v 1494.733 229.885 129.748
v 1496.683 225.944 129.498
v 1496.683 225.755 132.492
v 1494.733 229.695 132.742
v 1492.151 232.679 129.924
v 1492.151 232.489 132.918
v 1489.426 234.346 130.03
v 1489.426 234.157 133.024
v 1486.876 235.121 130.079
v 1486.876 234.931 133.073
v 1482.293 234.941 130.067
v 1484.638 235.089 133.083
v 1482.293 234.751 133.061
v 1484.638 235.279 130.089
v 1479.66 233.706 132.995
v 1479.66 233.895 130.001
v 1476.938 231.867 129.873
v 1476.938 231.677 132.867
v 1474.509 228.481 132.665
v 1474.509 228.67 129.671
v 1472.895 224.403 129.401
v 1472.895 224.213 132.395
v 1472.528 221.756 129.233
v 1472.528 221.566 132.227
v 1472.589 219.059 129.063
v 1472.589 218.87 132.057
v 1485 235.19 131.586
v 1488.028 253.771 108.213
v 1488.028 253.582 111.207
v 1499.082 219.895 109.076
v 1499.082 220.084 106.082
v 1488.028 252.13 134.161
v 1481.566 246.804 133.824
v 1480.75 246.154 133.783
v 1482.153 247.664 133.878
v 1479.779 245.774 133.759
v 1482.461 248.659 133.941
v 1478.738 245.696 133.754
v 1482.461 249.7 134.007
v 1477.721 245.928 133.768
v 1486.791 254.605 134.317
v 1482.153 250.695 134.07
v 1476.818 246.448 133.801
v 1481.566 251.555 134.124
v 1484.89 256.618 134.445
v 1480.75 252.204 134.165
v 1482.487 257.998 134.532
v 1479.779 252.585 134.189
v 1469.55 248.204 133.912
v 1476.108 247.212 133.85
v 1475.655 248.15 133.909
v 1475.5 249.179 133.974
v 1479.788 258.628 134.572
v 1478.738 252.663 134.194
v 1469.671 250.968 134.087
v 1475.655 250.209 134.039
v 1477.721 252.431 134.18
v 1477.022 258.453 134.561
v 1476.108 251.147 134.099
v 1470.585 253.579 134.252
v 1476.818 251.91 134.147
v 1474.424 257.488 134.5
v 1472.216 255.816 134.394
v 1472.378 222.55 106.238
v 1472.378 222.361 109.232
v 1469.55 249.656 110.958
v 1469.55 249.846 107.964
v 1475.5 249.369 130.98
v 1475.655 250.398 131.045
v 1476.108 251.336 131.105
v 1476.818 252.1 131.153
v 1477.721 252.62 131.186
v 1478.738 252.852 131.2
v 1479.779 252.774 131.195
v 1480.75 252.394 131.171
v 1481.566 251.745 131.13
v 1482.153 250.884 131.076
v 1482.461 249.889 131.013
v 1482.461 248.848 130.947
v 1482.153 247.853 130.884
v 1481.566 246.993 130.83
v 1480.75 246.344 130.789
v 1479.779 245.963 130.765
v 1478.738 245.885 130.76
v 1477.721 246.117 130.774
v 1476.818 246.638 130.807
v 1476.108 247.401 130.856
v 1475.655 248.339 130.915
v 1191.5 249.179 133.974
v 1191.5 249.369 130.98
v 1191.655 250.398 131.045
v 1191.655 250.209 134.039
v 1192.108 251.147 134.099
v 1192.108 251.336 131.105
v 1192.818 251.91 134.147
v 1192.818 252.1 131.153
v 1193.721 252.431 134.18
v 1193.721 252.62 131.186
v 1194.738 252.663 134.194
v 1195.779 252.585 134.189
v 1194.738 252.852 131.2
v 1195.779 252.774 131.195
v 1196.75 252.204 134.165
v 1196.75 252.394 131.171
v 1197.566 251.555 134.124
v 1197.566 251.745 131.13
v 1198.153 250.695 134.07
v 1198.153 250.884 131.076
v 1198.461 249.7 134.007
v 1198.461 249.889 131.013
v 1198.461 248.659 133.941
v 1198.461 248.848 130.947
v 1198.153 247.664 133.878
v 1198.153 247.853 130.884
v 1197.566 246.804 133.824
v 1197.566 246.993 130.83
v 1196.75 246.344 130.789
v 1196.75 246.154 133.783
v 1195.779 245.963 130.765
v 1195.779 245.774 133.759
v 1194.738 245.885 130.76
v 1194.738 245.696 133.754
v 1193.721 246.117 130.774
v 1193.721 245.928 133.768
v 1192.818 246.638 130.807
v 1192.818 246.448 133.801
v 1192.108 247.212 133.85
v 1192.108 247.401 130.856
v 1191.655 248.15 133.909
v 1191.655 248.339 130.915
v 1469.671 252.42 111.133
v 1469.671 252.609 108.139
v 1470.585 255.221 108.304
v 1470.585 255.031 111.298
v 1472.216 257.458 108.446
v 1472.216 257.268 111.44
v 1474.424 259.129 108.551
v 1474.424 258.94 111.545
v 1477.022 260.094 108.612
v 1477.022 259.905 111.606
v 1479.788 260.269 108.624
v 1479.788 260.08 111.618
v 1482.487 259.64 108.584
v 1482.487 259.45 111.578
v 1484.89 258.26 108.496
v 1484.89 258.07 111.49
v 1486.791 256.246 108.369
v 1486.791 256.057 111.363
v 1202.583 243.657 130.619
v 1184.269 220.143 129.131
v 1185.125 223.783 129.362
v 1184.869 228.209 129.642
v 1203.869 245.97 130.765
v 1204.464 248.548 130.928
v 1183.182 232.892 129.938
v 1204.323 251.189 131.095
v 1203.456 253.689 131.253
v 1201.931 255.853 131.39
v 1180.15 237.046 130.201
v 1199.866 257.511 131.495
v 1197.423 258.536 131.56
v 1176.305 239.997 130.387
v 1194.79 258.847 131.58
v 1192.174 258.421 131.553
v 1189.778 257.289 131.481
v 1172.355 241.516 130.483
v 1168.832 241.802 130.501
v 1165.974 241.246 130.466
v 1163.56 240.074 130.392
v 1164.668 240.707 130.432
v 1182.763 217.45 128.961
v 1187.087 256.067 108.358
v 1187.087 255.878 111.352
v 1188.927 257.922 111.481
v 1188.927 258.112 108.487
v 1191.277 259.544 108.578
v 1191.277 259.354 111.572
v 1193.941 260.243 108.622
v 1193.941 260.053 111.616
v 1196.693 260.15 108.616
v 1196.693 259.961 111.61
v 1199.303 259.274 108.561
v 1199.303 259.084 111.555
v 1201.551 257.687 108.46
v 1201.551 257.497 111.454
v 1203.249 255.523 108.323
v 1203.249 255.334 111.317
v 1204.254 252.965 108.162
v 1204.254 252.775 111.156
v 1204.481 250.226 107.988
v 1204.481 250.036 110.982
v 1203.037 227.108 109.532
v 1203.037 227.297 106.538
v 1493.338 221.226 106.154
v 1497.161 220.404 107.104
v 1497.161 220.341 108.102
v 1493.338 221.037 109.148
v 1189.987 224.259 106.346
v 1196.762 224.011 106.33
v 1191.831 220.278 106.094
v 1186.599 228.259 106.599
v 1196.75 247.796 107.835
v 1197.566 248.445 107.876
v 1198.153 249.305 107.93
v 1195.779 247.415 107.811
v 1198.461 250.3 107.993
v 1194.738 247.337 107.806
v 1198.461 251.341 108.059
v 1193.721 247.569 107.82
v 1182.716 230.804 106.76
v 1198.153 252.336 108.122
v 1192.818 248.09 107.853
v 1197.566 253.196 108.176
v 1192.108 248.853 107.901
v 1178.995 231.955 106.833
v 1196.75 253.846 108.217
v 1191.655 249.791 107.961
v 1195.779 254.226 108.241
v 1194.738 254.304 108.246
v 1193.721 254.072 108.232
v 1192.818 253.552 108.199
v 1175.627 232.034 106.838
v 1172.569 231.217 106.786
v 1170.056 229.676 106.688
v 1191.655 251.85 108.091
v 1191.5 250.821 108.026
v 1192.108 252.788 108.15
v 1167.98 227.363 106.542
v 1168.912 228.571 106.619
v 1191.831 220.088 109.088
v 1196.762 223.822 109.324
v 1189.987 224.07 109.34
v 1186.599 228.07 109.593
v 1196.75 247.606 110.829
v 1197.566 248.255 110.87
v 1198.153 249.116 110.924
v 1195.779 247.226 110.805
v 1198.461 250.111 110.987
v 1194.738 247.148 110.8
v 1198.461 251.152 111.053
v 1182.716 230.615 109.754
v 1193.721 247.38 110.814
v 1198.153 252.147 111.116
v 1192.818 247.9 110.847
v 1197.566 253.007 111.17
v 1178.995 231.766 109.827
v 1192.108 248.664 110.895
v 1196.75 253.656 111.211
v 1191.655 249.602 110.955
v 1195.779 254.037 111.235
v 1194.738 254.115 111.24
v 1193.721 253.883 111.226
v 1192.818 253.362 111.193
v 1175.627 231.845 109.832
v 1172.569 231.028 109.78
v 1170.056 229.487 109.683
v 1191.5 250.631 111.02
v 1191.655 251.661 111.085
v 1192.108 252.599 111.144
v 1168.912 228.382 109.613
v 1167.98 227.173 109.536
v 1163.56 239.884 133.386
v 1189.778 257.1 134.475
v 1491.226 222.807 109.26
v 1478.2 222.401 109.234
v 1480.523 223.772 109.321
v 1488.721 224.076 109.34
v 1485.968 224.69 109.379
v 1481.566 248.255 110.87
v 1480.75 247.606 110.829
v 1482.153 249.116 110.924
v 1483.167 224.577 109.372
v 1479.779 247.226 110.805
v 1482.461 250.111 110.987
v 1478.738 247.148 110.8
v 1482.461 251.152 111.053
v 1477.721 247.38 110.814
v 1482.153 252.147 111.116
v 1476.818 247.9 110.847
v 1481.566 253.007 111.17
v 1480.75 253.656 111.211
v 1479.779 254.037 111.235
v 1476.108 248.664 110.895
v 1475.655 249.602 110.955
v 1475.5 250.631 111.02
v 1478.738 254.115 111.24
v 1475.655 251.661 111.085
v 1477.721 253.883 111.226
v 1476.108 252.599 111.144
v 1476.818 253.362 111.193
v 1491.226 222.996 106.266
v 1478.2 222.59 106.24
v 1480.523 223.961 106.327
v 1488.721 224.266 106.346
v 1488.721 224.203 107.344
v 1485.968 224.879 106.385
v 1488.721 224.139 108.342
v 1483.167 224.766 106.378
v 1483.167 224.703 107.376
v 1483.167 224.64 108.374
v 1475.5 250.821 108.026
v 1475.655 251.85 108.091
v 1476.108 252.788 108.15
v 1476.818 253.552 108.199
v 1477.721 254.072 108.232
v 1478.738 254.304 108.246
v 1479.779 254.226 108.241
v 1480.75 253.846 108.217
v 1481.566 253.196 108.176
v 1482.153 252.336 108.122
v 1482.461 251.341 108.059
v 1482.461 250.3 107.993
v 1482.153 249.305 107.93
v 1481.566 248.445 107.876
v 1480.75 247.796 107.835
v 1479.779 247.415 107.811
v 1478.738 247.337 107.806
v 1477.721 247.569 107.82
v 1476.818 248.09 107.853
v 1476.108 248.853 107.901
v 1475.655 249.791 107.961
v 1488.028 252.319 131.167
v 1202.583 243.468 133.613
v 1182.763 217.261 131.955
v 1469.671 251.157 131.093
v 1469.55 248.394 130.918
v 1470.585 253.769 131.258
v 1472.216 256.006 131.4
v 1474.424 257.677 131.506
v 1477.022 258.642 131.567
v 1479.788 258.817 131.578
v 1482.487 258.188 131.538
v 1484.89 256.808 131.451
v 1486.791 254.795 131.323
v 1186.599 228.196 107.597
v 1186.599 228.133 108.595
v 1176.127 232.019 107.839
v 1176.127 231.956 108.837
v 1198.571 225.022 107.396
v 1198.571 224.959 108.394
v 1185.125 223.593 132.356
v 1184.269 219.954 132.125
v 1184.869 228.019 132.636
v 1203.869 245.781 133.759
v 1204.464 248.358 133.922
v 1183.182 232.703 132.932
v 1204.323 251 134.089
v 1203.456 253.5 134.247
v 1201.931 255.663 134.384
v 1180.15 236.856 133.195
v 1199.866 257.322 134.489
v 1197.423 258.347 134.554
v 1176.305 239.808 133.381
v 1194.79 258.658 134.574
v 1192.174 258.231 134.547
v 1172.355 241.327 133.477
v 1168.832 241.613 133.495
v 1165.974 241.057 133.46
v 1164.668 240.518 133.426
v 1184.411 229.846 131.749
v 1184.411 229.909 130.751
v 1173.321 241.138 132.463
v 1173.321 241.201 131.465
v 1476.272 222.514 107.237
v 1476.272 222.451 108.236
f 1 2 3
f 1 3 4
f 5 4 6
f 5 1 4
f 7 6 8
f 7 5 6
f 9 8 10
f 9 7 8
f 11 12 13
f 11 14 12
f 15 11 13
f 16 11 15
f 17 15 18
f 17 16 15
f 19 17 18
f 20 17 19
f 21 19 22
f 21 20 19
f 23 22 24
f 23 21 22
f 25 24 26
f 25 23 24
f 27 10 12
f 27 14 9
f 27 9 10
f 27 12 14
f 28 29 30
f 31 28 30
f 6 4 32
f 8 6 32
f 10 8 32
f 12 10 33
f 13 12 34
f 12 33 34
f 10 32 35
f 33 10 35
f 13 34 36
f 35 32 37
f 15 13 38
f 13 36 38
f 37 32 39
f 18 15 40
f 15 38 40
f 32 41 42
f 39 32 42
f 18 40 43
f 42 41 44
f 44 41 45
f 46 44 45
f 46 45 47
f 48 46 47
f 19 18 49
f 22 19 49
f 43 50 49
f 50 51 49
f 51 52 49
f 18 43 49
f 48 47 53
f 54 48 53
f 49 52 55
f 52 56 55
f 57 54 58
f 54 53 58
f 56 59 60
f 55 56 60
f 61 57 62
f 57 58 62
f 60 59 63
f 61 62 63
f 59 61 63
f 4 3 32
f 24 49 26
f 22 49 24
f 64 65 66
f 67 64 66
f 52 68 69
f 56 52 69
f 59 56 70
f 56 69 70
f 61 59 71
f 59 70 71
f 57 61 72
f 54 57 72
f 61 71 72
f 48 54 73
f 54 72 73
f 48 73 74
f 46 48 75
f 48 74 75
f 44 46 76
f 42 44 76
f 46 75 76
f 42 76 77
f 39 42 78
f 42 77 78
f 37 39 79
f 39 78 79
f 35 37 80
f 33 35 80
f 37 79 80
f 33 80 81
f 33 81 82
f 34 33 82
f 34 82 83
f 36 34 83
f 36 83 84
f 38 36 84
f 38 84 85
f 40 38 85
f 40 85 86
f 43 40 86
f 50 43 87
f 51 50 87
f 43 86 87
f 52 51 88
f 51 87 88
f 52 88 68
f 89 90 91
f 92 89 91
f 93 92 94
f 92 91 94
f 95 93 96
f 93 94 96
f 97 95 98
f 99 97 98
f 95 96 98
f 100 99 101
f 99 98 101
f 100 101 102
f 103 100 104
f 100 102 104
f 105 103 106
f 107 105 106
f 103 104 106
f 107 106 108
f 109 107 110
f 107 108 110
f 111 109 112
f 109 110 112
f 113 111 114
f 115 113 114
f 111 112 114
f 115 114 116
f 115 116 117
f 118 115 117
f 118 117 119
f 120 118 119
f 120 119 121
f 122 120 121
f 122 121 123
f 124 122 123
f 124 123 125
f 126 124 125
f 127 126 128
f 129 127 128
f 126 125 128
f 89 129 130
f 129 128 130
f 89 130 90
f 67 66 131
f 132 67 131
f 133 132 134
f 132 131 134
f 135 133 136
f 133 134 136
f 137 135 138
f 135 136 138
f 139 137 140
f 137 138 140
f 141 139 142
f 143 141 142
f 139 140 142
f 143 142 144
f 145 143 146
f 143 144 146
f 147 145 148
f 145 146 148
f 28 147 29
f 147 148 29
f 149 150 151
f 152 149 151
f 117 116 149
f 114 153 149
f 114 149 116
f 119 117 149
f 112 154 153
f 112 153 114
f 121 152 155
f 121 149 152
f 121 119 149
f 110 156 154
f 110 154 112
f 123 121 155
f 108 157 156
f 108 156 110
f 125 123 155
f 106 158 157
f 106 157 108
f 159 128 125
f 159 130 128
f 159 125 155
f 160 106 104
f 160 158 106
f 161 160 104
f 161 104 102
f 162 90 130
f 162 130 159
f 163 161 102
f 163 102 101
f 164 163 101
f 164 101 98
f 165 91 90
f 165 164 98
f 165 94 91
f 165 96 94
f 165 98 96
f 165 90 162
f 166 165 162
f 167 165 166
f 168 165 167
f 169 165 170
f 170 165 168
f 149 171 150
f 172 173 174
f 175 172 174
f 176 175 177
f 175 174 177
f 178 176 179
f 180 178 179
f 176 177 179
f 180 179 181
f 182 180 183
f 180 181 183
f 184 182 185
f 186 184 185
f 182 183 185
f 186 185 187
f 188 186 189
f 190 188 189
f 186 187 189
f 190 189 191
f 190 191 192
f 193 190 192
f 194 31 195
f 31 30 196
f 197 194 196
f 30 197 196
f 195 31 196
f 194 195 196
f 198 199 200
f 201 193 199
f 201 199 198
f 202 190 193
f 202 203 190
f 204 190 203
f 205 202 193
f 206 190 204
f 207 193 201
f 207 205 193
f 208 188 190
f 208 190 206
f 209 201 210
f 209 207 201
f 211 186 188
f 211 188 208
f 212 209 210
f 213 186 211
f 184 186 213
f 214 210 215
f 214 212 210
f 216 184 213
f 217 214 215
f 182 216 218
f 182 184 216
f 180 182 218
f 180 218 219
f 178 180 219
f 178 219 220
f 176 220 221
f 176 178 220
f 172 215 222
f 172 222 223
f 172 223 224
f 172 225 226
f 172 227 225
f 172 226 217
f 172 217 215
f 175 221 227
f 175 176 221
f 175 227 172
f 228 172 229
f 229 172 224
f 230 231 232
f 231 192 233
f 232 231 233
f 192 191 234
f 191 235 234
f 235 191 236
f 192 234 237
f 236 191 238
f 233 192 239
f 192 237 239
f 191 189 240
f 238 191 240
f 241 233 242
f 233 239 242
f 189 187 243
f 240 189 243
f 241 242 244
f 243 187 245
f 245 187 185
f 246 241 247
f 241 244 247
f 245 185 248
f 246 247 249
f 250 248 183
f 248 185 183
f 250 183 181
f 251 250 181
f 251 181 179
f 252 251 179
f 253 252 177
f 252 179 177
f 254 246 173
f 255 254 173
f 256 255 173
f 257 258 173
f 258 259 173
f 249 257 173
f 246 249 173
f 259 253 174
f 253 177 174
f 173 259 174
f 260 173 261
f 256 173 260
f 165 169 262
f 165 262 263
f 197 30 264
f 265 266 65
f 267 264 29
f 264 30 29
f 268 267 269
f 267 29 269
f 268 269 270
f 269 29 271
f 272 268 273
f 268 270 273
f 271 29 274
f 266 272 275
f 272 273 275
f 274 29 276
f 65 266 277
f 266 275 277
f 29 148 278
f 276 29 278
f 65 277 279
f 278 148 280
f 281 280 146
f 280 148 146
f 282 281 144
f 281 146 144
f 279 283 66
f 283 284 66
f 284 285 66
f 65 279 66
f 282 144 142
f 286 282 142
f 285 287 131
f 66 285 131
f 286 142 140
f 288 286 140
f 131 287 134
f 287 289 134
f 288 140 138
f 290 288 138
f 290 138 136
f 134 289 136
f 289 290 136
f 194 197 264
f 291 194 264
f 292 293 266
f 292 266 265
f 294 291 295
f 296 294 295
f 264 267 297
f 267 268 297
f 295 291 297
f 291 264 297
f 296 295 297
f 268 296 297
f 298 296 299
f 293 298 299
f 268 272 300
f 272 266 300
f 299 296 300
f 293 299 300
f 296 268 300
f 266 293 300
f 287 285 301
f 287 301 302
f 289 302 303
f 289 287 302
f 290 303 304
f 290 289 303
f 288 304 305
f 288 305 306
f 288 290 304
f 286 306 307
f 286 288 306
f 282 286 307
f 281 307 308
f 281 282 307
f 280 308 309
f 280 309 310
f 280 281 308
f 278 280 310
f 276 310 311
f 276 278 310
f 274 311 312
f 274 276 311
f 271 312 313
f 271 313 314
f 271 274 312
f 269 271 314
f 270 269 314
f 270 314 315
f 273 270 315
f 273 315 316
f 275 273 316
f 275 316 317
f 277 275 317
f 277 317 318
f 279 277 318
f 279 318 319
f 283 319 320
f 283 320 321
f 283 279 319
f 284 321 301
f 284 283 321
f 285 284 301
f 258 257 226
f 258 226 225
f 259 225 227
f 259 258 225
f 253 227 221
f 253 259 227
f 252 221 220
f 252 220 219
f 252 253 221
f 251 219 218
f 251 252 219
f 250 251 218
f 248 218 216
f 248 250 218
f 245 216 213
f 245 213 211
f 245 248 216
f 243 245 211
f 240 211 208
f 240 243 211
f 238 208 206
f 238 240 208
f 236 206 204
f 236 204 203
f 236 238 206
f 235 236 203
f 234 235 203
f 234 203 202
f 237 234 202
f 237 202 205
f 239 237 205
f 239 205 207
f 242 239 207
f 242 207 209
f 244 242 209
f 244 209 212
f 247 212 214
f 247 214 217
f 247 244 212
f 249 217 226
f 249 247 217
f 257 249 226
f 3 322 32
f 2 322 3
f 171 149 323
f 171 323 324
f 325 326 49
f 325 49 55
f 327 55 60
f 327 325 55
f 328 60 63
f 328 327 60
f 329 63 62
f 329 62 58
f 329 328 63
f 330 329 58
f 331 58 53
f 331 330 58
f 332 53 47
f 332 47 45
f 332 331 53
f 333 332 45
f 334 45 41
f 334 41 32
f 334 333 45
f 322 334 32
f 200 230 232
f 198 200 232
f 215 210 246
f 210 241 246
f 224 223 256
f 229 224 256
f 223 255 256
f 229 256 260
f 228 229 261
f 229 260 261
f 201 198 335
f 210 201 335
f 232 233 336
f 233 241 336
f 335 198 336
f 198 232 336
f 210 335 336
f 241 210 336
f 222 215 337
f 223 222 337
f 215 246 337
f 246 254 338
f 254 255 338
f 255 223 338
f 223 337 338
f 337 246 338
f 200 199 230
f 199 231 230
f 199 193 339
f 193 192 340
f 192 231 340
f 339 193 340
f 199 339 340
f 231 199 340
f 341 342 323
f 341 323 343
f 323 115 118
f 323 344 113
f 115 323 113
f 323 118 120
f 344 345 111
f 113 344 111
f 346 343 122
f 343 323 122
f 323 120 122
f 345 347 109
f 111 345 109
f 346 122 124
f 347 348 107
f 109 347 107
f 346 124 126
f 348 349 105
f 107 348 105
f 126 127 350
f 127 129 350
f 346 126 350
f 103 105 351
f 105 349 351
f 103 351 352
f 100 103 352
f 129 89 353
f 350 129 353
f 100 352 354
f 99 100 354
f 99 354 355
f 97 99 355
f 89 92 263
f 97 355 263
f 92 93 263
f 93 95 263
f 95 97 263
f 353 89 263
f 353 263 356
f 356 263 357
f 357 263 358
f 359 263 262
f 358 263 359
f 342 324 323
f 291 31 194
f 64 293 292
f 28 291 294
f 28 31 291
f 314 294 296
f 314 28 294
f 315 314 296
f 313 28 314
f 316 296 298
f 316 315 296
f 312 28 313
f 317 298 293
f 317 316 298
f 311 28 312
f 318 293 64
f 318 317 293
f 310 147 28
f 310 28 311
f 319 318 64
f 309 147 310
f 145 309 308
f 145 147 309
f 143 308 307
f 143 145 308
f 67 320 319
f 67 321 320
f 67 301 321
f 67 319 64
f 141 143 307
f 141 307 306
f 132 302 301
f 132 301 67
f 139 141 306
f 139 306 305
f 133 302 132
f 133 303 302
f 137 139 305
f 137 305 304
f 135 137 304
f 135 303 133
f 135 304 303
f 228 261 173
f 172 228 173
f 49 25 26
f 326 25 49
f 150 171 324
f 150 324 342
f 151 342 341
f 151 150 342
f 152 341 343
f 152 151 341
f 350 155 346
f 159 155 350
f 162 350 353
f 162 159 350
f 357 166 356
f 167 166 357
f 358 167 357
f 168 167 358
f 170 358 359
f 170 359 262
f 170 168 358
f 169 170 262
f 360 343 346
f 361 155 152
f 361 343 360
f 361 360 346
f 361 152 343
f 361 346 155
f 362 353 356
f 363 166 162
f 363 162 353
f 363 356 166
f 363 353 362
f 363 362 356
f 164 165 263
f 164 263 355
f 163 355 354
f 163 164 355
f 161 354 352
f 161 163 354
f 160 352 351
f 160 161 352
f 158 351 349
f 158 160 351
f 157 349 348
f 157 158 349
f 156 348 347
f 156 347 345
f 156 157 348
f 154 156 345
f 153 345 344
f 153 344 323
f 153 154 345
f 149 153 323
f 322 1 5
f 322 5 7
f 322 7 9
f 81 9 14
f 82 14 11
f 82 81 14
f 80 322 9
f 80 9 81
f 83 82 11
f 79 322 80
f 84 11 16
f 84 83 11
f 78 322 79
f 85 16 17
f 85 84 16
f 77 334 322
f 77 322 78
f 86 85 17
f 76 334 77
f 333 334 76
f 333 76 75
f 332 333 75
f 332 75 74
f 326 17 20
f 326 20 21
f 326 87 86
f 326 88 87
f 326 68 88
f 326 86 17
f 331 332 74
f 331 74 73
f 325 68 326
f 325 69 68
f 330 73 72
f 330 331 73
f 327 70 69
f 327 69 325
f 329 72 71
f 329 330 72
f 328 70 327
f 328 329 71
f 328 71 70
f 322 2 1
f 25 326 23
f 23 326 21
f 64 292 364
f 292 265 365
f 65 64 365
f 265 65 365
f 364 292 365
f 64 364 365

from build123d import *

# Parameters (mm, degrees)
SZKIC1_R                      = 3.5
DODANIE_WYCI_GNI_CIE1_DEPTH   = 3
DODANIE_WYCI_GNI_CIE1_2_DEPTH = 3
SZKIC2_R                      = 3.5
DODANIE_WYCI_GNI_CIE2_DEPTH   = 3
DODANIE_WYCI_GNI_CIE2_2_DEPTH = 3


with BuildPart() as part:
    # Szkic1 → Dodanie-wyciągnięcie1 (new body)
    with BuildSketch(Plane(origin=(0, -7.25805409, 114.747845399), x_dir=(-1, 0, 0), z_dir=(0, 0.063126051, -0.998005562))):
        with BuildLine():
            ThreePointArc((-1469.550369154, 256.162669348), (-1477.021998182, 266.4314406), (-1488.028232153, 260.096164982))
            Line((-1488.028232153, 260.096164982), (-1496.682707646, 233.668286007))
            add(Edge.make_bspline(
                [(-1496.682707646, 233.668286007), (-1494.549268537, 240.183096826), (-1489.671600164, 243.027652706), (-1485, 243.027652706), (-1478.171550536, 243.027652706), (-1471.493308251, 237.369876498), (-1472.589244959, 226.769589758)],
                knots=[0.295959603, 0.295959603, 0.295959603, 0.295959603, 0.5, 0.5, 0.5, 0.76496368, 0.76496368, 0.76496368, 0.76496368], degree=3, weights=[0.516898281, 0.56691223, 0.727946137, 1, 0.646715093, 0.480645525, 0.501791294]))
            Line((-1472.589244959, 226.769589758), (-1469.550369154, 256.162669348))
        make_face()
        with Locations((-1479, 257.139642668)):
            Circle(SZKIC1_R, mode=Mode.SUBTRACT)
    extrude(amount=-DODANIE_WYCI_GNI_CIE1_DEPTH)


with BuildPart() as body_2:
    # Szkic1 → Dodanie-wyci_gni_cie1 2 (new body)
    with BuildSketch(Plane(origin=(0, -7.25805409, 114.747845399), x_dir=(-1, 0, 0), z_dir=(0, 0.063126051, -0.998005562))):
        with BuildLine():
            Line((-1163.559881906, 247.826017638), (-1189.778452634, 265.07597955))
            ThreePointArc((-1189.778452634, 265.07597955), (-1201.931051804, 263.636605104), (-1202.582523544, 251.416414846))
            Line((-1202.582523544, 251.416414846), (-1182.76254688, 225.157554572))
            add(Edge.make_bspline(
                [(-1182.76254688, 225.157554572), (-1195.705807464, 242.305671187), (-1178.155883632, 257.429152624), (-1163.559881906, 247.826017638)],
                knots=[0.562562367, 0.562562367, 0.562562367, 0.562562367, 0.999146732, 0.999146732, 0.999146732, 0.999146732], degree=3, weights=[0.781062929, 0.344623783, 0.416467058, 0.996592754]))
        make_face()
        with Locations((-1195, 257.139642668)):
            Circle(SZKIC1_R, mode=Mode.SUBTRACT)
    extrude(amount=-DODANIE_WYCI_GNI_CIE1_2_DEPTH)


with BuildPart() as body_3:
    # Szkic2 → Dodanie-wyciągnięcie2 (new body)
    with BuildSketch(Plane(origin=(0, -5.995533068, 94.78773416), x_dir=(-1, 0, 0), z_dir=(0, 0.063126051, -0.998005562))):
        with BuildLine():
            add(Edge.make_bspline(
                [(-1499.081969424, 226.341741496), (-1497.164459003, 226.72545054), (-1495.249800372, 227.106857649), (-1493.338408358, 227.485899627)],
                knots=[0.978069865, 0.978069865, 0.978069865, 0.978069865, 0.987766131, 0.987766131, 0.987766131, 0.987766131], degree=3, weights=[0.974357504, 0.977963363, 0.981645873, 0.985405033]))
            add(Edge.make_bspline(
                [(-1493.338408358, 227.485899627), (-1488.968930095, 232.032323973), (-1483.121424188, 232.560272537), (-1478.200062015, 228.852682039)],
                knots=[0, 0, 0, 0, 1, 1, 1, 1], degree=3, weights=[1, 0.862951749, 0.862951749, 1]))
            add(Edge.make_bspline(
                [(-1478.200062015, 228.852682039), (-1476.26470701, 228.840500886), (-1474.323901246, 228.827162356), (-1472.378018702, 228.812644683)],
                knots=[0.015705516, 0.015705516, 0.015705516, 0.015705516, 0.02688398, 0.02688398, 0.02688398, 0.02688398], degree=3, weights=[0.970194637, 0.963236106, 0.956357884, 0.94955997]))
            Line((-1472.378018702, 228.812644683), (-1469.550369154, 256.162669348))
            ThreePointArc((-1469.550369154, 256.162669348), (-1477.021998182, 266.4314406), (-1488.028232153, 260.096164982))
            Line((-1488.028232153, 260.096164982), (-1499.081969424, 226.341741496))
        make_face()
        with Locations((-1479, 257.139642668)):
            Circle(SZKIC2_R, mode=Mode.SUBTRACT)
    extrude(amount=DODANIE_WYCI_GNI_CIE2_DEPTH)


with BuildPart() as body_4:
    # Szkic2 → Dodanie-wyci_gni_cie2 2 (new body)
    with BuildSketch(Plane(origin=(0, -5.995533068, 94.78773416), x_dir=(-1, 0, 0), z_dir=(0, 0.063126051, -0.998005562))):
        with BuildLine():
            ThreePointArc((-1187.086998027, 262.396485806), (-1198.029684937, 266.143586758), (-1204.481282298, 256.543583953))
            Line((-1204.481282298, 256.543583953), (-1203.036946157, 233.569070978))
            add(Edge.make_bspline(
                [(-1203.036946157, 233.569070978), (-1198.394891016, 231.545198423), (-1194.600848133, 229.118580489), (-1191.830864188, 226.535755676)],
                knots=[0.780966017, 0.780966017, 0.780966017, 0.780966017, 0.856944696, 0.856944696, 0.856944696, 0.856944696], degree=3, weights=[0.507671154, 0.520219191, 0.548161255, 0.591497344]))
            add(Edge.make_bspline(
                [(-1191.830864188, 226.535755676), (-1187.789848964, 239.236197933), (-1175.216880476, 244.52867786), (-1167.979845348, 233.634939595)],
                knots=[0, 0, 0, 0, 0.413856164, 0.413856164, 0.413856164, 0.413856164], degree=3, weights=[1, 0.591861089, 0.521543786, 0.789048091]))
            Line((-1167.979845348, 233.634939595), (-1187.086998027, 262.396485806))
        make_face()
        with Locations((-1195, 257.139642668)):
            Circle(SZKIC2_R, mode=Mode.SUBTRACT)
    extrude(amount=DODANIE_WYCI_GNI_CIE2_2_DEPTH)


solid = Compound([part.part, body_2.part, body_3.part, body_4.part])
